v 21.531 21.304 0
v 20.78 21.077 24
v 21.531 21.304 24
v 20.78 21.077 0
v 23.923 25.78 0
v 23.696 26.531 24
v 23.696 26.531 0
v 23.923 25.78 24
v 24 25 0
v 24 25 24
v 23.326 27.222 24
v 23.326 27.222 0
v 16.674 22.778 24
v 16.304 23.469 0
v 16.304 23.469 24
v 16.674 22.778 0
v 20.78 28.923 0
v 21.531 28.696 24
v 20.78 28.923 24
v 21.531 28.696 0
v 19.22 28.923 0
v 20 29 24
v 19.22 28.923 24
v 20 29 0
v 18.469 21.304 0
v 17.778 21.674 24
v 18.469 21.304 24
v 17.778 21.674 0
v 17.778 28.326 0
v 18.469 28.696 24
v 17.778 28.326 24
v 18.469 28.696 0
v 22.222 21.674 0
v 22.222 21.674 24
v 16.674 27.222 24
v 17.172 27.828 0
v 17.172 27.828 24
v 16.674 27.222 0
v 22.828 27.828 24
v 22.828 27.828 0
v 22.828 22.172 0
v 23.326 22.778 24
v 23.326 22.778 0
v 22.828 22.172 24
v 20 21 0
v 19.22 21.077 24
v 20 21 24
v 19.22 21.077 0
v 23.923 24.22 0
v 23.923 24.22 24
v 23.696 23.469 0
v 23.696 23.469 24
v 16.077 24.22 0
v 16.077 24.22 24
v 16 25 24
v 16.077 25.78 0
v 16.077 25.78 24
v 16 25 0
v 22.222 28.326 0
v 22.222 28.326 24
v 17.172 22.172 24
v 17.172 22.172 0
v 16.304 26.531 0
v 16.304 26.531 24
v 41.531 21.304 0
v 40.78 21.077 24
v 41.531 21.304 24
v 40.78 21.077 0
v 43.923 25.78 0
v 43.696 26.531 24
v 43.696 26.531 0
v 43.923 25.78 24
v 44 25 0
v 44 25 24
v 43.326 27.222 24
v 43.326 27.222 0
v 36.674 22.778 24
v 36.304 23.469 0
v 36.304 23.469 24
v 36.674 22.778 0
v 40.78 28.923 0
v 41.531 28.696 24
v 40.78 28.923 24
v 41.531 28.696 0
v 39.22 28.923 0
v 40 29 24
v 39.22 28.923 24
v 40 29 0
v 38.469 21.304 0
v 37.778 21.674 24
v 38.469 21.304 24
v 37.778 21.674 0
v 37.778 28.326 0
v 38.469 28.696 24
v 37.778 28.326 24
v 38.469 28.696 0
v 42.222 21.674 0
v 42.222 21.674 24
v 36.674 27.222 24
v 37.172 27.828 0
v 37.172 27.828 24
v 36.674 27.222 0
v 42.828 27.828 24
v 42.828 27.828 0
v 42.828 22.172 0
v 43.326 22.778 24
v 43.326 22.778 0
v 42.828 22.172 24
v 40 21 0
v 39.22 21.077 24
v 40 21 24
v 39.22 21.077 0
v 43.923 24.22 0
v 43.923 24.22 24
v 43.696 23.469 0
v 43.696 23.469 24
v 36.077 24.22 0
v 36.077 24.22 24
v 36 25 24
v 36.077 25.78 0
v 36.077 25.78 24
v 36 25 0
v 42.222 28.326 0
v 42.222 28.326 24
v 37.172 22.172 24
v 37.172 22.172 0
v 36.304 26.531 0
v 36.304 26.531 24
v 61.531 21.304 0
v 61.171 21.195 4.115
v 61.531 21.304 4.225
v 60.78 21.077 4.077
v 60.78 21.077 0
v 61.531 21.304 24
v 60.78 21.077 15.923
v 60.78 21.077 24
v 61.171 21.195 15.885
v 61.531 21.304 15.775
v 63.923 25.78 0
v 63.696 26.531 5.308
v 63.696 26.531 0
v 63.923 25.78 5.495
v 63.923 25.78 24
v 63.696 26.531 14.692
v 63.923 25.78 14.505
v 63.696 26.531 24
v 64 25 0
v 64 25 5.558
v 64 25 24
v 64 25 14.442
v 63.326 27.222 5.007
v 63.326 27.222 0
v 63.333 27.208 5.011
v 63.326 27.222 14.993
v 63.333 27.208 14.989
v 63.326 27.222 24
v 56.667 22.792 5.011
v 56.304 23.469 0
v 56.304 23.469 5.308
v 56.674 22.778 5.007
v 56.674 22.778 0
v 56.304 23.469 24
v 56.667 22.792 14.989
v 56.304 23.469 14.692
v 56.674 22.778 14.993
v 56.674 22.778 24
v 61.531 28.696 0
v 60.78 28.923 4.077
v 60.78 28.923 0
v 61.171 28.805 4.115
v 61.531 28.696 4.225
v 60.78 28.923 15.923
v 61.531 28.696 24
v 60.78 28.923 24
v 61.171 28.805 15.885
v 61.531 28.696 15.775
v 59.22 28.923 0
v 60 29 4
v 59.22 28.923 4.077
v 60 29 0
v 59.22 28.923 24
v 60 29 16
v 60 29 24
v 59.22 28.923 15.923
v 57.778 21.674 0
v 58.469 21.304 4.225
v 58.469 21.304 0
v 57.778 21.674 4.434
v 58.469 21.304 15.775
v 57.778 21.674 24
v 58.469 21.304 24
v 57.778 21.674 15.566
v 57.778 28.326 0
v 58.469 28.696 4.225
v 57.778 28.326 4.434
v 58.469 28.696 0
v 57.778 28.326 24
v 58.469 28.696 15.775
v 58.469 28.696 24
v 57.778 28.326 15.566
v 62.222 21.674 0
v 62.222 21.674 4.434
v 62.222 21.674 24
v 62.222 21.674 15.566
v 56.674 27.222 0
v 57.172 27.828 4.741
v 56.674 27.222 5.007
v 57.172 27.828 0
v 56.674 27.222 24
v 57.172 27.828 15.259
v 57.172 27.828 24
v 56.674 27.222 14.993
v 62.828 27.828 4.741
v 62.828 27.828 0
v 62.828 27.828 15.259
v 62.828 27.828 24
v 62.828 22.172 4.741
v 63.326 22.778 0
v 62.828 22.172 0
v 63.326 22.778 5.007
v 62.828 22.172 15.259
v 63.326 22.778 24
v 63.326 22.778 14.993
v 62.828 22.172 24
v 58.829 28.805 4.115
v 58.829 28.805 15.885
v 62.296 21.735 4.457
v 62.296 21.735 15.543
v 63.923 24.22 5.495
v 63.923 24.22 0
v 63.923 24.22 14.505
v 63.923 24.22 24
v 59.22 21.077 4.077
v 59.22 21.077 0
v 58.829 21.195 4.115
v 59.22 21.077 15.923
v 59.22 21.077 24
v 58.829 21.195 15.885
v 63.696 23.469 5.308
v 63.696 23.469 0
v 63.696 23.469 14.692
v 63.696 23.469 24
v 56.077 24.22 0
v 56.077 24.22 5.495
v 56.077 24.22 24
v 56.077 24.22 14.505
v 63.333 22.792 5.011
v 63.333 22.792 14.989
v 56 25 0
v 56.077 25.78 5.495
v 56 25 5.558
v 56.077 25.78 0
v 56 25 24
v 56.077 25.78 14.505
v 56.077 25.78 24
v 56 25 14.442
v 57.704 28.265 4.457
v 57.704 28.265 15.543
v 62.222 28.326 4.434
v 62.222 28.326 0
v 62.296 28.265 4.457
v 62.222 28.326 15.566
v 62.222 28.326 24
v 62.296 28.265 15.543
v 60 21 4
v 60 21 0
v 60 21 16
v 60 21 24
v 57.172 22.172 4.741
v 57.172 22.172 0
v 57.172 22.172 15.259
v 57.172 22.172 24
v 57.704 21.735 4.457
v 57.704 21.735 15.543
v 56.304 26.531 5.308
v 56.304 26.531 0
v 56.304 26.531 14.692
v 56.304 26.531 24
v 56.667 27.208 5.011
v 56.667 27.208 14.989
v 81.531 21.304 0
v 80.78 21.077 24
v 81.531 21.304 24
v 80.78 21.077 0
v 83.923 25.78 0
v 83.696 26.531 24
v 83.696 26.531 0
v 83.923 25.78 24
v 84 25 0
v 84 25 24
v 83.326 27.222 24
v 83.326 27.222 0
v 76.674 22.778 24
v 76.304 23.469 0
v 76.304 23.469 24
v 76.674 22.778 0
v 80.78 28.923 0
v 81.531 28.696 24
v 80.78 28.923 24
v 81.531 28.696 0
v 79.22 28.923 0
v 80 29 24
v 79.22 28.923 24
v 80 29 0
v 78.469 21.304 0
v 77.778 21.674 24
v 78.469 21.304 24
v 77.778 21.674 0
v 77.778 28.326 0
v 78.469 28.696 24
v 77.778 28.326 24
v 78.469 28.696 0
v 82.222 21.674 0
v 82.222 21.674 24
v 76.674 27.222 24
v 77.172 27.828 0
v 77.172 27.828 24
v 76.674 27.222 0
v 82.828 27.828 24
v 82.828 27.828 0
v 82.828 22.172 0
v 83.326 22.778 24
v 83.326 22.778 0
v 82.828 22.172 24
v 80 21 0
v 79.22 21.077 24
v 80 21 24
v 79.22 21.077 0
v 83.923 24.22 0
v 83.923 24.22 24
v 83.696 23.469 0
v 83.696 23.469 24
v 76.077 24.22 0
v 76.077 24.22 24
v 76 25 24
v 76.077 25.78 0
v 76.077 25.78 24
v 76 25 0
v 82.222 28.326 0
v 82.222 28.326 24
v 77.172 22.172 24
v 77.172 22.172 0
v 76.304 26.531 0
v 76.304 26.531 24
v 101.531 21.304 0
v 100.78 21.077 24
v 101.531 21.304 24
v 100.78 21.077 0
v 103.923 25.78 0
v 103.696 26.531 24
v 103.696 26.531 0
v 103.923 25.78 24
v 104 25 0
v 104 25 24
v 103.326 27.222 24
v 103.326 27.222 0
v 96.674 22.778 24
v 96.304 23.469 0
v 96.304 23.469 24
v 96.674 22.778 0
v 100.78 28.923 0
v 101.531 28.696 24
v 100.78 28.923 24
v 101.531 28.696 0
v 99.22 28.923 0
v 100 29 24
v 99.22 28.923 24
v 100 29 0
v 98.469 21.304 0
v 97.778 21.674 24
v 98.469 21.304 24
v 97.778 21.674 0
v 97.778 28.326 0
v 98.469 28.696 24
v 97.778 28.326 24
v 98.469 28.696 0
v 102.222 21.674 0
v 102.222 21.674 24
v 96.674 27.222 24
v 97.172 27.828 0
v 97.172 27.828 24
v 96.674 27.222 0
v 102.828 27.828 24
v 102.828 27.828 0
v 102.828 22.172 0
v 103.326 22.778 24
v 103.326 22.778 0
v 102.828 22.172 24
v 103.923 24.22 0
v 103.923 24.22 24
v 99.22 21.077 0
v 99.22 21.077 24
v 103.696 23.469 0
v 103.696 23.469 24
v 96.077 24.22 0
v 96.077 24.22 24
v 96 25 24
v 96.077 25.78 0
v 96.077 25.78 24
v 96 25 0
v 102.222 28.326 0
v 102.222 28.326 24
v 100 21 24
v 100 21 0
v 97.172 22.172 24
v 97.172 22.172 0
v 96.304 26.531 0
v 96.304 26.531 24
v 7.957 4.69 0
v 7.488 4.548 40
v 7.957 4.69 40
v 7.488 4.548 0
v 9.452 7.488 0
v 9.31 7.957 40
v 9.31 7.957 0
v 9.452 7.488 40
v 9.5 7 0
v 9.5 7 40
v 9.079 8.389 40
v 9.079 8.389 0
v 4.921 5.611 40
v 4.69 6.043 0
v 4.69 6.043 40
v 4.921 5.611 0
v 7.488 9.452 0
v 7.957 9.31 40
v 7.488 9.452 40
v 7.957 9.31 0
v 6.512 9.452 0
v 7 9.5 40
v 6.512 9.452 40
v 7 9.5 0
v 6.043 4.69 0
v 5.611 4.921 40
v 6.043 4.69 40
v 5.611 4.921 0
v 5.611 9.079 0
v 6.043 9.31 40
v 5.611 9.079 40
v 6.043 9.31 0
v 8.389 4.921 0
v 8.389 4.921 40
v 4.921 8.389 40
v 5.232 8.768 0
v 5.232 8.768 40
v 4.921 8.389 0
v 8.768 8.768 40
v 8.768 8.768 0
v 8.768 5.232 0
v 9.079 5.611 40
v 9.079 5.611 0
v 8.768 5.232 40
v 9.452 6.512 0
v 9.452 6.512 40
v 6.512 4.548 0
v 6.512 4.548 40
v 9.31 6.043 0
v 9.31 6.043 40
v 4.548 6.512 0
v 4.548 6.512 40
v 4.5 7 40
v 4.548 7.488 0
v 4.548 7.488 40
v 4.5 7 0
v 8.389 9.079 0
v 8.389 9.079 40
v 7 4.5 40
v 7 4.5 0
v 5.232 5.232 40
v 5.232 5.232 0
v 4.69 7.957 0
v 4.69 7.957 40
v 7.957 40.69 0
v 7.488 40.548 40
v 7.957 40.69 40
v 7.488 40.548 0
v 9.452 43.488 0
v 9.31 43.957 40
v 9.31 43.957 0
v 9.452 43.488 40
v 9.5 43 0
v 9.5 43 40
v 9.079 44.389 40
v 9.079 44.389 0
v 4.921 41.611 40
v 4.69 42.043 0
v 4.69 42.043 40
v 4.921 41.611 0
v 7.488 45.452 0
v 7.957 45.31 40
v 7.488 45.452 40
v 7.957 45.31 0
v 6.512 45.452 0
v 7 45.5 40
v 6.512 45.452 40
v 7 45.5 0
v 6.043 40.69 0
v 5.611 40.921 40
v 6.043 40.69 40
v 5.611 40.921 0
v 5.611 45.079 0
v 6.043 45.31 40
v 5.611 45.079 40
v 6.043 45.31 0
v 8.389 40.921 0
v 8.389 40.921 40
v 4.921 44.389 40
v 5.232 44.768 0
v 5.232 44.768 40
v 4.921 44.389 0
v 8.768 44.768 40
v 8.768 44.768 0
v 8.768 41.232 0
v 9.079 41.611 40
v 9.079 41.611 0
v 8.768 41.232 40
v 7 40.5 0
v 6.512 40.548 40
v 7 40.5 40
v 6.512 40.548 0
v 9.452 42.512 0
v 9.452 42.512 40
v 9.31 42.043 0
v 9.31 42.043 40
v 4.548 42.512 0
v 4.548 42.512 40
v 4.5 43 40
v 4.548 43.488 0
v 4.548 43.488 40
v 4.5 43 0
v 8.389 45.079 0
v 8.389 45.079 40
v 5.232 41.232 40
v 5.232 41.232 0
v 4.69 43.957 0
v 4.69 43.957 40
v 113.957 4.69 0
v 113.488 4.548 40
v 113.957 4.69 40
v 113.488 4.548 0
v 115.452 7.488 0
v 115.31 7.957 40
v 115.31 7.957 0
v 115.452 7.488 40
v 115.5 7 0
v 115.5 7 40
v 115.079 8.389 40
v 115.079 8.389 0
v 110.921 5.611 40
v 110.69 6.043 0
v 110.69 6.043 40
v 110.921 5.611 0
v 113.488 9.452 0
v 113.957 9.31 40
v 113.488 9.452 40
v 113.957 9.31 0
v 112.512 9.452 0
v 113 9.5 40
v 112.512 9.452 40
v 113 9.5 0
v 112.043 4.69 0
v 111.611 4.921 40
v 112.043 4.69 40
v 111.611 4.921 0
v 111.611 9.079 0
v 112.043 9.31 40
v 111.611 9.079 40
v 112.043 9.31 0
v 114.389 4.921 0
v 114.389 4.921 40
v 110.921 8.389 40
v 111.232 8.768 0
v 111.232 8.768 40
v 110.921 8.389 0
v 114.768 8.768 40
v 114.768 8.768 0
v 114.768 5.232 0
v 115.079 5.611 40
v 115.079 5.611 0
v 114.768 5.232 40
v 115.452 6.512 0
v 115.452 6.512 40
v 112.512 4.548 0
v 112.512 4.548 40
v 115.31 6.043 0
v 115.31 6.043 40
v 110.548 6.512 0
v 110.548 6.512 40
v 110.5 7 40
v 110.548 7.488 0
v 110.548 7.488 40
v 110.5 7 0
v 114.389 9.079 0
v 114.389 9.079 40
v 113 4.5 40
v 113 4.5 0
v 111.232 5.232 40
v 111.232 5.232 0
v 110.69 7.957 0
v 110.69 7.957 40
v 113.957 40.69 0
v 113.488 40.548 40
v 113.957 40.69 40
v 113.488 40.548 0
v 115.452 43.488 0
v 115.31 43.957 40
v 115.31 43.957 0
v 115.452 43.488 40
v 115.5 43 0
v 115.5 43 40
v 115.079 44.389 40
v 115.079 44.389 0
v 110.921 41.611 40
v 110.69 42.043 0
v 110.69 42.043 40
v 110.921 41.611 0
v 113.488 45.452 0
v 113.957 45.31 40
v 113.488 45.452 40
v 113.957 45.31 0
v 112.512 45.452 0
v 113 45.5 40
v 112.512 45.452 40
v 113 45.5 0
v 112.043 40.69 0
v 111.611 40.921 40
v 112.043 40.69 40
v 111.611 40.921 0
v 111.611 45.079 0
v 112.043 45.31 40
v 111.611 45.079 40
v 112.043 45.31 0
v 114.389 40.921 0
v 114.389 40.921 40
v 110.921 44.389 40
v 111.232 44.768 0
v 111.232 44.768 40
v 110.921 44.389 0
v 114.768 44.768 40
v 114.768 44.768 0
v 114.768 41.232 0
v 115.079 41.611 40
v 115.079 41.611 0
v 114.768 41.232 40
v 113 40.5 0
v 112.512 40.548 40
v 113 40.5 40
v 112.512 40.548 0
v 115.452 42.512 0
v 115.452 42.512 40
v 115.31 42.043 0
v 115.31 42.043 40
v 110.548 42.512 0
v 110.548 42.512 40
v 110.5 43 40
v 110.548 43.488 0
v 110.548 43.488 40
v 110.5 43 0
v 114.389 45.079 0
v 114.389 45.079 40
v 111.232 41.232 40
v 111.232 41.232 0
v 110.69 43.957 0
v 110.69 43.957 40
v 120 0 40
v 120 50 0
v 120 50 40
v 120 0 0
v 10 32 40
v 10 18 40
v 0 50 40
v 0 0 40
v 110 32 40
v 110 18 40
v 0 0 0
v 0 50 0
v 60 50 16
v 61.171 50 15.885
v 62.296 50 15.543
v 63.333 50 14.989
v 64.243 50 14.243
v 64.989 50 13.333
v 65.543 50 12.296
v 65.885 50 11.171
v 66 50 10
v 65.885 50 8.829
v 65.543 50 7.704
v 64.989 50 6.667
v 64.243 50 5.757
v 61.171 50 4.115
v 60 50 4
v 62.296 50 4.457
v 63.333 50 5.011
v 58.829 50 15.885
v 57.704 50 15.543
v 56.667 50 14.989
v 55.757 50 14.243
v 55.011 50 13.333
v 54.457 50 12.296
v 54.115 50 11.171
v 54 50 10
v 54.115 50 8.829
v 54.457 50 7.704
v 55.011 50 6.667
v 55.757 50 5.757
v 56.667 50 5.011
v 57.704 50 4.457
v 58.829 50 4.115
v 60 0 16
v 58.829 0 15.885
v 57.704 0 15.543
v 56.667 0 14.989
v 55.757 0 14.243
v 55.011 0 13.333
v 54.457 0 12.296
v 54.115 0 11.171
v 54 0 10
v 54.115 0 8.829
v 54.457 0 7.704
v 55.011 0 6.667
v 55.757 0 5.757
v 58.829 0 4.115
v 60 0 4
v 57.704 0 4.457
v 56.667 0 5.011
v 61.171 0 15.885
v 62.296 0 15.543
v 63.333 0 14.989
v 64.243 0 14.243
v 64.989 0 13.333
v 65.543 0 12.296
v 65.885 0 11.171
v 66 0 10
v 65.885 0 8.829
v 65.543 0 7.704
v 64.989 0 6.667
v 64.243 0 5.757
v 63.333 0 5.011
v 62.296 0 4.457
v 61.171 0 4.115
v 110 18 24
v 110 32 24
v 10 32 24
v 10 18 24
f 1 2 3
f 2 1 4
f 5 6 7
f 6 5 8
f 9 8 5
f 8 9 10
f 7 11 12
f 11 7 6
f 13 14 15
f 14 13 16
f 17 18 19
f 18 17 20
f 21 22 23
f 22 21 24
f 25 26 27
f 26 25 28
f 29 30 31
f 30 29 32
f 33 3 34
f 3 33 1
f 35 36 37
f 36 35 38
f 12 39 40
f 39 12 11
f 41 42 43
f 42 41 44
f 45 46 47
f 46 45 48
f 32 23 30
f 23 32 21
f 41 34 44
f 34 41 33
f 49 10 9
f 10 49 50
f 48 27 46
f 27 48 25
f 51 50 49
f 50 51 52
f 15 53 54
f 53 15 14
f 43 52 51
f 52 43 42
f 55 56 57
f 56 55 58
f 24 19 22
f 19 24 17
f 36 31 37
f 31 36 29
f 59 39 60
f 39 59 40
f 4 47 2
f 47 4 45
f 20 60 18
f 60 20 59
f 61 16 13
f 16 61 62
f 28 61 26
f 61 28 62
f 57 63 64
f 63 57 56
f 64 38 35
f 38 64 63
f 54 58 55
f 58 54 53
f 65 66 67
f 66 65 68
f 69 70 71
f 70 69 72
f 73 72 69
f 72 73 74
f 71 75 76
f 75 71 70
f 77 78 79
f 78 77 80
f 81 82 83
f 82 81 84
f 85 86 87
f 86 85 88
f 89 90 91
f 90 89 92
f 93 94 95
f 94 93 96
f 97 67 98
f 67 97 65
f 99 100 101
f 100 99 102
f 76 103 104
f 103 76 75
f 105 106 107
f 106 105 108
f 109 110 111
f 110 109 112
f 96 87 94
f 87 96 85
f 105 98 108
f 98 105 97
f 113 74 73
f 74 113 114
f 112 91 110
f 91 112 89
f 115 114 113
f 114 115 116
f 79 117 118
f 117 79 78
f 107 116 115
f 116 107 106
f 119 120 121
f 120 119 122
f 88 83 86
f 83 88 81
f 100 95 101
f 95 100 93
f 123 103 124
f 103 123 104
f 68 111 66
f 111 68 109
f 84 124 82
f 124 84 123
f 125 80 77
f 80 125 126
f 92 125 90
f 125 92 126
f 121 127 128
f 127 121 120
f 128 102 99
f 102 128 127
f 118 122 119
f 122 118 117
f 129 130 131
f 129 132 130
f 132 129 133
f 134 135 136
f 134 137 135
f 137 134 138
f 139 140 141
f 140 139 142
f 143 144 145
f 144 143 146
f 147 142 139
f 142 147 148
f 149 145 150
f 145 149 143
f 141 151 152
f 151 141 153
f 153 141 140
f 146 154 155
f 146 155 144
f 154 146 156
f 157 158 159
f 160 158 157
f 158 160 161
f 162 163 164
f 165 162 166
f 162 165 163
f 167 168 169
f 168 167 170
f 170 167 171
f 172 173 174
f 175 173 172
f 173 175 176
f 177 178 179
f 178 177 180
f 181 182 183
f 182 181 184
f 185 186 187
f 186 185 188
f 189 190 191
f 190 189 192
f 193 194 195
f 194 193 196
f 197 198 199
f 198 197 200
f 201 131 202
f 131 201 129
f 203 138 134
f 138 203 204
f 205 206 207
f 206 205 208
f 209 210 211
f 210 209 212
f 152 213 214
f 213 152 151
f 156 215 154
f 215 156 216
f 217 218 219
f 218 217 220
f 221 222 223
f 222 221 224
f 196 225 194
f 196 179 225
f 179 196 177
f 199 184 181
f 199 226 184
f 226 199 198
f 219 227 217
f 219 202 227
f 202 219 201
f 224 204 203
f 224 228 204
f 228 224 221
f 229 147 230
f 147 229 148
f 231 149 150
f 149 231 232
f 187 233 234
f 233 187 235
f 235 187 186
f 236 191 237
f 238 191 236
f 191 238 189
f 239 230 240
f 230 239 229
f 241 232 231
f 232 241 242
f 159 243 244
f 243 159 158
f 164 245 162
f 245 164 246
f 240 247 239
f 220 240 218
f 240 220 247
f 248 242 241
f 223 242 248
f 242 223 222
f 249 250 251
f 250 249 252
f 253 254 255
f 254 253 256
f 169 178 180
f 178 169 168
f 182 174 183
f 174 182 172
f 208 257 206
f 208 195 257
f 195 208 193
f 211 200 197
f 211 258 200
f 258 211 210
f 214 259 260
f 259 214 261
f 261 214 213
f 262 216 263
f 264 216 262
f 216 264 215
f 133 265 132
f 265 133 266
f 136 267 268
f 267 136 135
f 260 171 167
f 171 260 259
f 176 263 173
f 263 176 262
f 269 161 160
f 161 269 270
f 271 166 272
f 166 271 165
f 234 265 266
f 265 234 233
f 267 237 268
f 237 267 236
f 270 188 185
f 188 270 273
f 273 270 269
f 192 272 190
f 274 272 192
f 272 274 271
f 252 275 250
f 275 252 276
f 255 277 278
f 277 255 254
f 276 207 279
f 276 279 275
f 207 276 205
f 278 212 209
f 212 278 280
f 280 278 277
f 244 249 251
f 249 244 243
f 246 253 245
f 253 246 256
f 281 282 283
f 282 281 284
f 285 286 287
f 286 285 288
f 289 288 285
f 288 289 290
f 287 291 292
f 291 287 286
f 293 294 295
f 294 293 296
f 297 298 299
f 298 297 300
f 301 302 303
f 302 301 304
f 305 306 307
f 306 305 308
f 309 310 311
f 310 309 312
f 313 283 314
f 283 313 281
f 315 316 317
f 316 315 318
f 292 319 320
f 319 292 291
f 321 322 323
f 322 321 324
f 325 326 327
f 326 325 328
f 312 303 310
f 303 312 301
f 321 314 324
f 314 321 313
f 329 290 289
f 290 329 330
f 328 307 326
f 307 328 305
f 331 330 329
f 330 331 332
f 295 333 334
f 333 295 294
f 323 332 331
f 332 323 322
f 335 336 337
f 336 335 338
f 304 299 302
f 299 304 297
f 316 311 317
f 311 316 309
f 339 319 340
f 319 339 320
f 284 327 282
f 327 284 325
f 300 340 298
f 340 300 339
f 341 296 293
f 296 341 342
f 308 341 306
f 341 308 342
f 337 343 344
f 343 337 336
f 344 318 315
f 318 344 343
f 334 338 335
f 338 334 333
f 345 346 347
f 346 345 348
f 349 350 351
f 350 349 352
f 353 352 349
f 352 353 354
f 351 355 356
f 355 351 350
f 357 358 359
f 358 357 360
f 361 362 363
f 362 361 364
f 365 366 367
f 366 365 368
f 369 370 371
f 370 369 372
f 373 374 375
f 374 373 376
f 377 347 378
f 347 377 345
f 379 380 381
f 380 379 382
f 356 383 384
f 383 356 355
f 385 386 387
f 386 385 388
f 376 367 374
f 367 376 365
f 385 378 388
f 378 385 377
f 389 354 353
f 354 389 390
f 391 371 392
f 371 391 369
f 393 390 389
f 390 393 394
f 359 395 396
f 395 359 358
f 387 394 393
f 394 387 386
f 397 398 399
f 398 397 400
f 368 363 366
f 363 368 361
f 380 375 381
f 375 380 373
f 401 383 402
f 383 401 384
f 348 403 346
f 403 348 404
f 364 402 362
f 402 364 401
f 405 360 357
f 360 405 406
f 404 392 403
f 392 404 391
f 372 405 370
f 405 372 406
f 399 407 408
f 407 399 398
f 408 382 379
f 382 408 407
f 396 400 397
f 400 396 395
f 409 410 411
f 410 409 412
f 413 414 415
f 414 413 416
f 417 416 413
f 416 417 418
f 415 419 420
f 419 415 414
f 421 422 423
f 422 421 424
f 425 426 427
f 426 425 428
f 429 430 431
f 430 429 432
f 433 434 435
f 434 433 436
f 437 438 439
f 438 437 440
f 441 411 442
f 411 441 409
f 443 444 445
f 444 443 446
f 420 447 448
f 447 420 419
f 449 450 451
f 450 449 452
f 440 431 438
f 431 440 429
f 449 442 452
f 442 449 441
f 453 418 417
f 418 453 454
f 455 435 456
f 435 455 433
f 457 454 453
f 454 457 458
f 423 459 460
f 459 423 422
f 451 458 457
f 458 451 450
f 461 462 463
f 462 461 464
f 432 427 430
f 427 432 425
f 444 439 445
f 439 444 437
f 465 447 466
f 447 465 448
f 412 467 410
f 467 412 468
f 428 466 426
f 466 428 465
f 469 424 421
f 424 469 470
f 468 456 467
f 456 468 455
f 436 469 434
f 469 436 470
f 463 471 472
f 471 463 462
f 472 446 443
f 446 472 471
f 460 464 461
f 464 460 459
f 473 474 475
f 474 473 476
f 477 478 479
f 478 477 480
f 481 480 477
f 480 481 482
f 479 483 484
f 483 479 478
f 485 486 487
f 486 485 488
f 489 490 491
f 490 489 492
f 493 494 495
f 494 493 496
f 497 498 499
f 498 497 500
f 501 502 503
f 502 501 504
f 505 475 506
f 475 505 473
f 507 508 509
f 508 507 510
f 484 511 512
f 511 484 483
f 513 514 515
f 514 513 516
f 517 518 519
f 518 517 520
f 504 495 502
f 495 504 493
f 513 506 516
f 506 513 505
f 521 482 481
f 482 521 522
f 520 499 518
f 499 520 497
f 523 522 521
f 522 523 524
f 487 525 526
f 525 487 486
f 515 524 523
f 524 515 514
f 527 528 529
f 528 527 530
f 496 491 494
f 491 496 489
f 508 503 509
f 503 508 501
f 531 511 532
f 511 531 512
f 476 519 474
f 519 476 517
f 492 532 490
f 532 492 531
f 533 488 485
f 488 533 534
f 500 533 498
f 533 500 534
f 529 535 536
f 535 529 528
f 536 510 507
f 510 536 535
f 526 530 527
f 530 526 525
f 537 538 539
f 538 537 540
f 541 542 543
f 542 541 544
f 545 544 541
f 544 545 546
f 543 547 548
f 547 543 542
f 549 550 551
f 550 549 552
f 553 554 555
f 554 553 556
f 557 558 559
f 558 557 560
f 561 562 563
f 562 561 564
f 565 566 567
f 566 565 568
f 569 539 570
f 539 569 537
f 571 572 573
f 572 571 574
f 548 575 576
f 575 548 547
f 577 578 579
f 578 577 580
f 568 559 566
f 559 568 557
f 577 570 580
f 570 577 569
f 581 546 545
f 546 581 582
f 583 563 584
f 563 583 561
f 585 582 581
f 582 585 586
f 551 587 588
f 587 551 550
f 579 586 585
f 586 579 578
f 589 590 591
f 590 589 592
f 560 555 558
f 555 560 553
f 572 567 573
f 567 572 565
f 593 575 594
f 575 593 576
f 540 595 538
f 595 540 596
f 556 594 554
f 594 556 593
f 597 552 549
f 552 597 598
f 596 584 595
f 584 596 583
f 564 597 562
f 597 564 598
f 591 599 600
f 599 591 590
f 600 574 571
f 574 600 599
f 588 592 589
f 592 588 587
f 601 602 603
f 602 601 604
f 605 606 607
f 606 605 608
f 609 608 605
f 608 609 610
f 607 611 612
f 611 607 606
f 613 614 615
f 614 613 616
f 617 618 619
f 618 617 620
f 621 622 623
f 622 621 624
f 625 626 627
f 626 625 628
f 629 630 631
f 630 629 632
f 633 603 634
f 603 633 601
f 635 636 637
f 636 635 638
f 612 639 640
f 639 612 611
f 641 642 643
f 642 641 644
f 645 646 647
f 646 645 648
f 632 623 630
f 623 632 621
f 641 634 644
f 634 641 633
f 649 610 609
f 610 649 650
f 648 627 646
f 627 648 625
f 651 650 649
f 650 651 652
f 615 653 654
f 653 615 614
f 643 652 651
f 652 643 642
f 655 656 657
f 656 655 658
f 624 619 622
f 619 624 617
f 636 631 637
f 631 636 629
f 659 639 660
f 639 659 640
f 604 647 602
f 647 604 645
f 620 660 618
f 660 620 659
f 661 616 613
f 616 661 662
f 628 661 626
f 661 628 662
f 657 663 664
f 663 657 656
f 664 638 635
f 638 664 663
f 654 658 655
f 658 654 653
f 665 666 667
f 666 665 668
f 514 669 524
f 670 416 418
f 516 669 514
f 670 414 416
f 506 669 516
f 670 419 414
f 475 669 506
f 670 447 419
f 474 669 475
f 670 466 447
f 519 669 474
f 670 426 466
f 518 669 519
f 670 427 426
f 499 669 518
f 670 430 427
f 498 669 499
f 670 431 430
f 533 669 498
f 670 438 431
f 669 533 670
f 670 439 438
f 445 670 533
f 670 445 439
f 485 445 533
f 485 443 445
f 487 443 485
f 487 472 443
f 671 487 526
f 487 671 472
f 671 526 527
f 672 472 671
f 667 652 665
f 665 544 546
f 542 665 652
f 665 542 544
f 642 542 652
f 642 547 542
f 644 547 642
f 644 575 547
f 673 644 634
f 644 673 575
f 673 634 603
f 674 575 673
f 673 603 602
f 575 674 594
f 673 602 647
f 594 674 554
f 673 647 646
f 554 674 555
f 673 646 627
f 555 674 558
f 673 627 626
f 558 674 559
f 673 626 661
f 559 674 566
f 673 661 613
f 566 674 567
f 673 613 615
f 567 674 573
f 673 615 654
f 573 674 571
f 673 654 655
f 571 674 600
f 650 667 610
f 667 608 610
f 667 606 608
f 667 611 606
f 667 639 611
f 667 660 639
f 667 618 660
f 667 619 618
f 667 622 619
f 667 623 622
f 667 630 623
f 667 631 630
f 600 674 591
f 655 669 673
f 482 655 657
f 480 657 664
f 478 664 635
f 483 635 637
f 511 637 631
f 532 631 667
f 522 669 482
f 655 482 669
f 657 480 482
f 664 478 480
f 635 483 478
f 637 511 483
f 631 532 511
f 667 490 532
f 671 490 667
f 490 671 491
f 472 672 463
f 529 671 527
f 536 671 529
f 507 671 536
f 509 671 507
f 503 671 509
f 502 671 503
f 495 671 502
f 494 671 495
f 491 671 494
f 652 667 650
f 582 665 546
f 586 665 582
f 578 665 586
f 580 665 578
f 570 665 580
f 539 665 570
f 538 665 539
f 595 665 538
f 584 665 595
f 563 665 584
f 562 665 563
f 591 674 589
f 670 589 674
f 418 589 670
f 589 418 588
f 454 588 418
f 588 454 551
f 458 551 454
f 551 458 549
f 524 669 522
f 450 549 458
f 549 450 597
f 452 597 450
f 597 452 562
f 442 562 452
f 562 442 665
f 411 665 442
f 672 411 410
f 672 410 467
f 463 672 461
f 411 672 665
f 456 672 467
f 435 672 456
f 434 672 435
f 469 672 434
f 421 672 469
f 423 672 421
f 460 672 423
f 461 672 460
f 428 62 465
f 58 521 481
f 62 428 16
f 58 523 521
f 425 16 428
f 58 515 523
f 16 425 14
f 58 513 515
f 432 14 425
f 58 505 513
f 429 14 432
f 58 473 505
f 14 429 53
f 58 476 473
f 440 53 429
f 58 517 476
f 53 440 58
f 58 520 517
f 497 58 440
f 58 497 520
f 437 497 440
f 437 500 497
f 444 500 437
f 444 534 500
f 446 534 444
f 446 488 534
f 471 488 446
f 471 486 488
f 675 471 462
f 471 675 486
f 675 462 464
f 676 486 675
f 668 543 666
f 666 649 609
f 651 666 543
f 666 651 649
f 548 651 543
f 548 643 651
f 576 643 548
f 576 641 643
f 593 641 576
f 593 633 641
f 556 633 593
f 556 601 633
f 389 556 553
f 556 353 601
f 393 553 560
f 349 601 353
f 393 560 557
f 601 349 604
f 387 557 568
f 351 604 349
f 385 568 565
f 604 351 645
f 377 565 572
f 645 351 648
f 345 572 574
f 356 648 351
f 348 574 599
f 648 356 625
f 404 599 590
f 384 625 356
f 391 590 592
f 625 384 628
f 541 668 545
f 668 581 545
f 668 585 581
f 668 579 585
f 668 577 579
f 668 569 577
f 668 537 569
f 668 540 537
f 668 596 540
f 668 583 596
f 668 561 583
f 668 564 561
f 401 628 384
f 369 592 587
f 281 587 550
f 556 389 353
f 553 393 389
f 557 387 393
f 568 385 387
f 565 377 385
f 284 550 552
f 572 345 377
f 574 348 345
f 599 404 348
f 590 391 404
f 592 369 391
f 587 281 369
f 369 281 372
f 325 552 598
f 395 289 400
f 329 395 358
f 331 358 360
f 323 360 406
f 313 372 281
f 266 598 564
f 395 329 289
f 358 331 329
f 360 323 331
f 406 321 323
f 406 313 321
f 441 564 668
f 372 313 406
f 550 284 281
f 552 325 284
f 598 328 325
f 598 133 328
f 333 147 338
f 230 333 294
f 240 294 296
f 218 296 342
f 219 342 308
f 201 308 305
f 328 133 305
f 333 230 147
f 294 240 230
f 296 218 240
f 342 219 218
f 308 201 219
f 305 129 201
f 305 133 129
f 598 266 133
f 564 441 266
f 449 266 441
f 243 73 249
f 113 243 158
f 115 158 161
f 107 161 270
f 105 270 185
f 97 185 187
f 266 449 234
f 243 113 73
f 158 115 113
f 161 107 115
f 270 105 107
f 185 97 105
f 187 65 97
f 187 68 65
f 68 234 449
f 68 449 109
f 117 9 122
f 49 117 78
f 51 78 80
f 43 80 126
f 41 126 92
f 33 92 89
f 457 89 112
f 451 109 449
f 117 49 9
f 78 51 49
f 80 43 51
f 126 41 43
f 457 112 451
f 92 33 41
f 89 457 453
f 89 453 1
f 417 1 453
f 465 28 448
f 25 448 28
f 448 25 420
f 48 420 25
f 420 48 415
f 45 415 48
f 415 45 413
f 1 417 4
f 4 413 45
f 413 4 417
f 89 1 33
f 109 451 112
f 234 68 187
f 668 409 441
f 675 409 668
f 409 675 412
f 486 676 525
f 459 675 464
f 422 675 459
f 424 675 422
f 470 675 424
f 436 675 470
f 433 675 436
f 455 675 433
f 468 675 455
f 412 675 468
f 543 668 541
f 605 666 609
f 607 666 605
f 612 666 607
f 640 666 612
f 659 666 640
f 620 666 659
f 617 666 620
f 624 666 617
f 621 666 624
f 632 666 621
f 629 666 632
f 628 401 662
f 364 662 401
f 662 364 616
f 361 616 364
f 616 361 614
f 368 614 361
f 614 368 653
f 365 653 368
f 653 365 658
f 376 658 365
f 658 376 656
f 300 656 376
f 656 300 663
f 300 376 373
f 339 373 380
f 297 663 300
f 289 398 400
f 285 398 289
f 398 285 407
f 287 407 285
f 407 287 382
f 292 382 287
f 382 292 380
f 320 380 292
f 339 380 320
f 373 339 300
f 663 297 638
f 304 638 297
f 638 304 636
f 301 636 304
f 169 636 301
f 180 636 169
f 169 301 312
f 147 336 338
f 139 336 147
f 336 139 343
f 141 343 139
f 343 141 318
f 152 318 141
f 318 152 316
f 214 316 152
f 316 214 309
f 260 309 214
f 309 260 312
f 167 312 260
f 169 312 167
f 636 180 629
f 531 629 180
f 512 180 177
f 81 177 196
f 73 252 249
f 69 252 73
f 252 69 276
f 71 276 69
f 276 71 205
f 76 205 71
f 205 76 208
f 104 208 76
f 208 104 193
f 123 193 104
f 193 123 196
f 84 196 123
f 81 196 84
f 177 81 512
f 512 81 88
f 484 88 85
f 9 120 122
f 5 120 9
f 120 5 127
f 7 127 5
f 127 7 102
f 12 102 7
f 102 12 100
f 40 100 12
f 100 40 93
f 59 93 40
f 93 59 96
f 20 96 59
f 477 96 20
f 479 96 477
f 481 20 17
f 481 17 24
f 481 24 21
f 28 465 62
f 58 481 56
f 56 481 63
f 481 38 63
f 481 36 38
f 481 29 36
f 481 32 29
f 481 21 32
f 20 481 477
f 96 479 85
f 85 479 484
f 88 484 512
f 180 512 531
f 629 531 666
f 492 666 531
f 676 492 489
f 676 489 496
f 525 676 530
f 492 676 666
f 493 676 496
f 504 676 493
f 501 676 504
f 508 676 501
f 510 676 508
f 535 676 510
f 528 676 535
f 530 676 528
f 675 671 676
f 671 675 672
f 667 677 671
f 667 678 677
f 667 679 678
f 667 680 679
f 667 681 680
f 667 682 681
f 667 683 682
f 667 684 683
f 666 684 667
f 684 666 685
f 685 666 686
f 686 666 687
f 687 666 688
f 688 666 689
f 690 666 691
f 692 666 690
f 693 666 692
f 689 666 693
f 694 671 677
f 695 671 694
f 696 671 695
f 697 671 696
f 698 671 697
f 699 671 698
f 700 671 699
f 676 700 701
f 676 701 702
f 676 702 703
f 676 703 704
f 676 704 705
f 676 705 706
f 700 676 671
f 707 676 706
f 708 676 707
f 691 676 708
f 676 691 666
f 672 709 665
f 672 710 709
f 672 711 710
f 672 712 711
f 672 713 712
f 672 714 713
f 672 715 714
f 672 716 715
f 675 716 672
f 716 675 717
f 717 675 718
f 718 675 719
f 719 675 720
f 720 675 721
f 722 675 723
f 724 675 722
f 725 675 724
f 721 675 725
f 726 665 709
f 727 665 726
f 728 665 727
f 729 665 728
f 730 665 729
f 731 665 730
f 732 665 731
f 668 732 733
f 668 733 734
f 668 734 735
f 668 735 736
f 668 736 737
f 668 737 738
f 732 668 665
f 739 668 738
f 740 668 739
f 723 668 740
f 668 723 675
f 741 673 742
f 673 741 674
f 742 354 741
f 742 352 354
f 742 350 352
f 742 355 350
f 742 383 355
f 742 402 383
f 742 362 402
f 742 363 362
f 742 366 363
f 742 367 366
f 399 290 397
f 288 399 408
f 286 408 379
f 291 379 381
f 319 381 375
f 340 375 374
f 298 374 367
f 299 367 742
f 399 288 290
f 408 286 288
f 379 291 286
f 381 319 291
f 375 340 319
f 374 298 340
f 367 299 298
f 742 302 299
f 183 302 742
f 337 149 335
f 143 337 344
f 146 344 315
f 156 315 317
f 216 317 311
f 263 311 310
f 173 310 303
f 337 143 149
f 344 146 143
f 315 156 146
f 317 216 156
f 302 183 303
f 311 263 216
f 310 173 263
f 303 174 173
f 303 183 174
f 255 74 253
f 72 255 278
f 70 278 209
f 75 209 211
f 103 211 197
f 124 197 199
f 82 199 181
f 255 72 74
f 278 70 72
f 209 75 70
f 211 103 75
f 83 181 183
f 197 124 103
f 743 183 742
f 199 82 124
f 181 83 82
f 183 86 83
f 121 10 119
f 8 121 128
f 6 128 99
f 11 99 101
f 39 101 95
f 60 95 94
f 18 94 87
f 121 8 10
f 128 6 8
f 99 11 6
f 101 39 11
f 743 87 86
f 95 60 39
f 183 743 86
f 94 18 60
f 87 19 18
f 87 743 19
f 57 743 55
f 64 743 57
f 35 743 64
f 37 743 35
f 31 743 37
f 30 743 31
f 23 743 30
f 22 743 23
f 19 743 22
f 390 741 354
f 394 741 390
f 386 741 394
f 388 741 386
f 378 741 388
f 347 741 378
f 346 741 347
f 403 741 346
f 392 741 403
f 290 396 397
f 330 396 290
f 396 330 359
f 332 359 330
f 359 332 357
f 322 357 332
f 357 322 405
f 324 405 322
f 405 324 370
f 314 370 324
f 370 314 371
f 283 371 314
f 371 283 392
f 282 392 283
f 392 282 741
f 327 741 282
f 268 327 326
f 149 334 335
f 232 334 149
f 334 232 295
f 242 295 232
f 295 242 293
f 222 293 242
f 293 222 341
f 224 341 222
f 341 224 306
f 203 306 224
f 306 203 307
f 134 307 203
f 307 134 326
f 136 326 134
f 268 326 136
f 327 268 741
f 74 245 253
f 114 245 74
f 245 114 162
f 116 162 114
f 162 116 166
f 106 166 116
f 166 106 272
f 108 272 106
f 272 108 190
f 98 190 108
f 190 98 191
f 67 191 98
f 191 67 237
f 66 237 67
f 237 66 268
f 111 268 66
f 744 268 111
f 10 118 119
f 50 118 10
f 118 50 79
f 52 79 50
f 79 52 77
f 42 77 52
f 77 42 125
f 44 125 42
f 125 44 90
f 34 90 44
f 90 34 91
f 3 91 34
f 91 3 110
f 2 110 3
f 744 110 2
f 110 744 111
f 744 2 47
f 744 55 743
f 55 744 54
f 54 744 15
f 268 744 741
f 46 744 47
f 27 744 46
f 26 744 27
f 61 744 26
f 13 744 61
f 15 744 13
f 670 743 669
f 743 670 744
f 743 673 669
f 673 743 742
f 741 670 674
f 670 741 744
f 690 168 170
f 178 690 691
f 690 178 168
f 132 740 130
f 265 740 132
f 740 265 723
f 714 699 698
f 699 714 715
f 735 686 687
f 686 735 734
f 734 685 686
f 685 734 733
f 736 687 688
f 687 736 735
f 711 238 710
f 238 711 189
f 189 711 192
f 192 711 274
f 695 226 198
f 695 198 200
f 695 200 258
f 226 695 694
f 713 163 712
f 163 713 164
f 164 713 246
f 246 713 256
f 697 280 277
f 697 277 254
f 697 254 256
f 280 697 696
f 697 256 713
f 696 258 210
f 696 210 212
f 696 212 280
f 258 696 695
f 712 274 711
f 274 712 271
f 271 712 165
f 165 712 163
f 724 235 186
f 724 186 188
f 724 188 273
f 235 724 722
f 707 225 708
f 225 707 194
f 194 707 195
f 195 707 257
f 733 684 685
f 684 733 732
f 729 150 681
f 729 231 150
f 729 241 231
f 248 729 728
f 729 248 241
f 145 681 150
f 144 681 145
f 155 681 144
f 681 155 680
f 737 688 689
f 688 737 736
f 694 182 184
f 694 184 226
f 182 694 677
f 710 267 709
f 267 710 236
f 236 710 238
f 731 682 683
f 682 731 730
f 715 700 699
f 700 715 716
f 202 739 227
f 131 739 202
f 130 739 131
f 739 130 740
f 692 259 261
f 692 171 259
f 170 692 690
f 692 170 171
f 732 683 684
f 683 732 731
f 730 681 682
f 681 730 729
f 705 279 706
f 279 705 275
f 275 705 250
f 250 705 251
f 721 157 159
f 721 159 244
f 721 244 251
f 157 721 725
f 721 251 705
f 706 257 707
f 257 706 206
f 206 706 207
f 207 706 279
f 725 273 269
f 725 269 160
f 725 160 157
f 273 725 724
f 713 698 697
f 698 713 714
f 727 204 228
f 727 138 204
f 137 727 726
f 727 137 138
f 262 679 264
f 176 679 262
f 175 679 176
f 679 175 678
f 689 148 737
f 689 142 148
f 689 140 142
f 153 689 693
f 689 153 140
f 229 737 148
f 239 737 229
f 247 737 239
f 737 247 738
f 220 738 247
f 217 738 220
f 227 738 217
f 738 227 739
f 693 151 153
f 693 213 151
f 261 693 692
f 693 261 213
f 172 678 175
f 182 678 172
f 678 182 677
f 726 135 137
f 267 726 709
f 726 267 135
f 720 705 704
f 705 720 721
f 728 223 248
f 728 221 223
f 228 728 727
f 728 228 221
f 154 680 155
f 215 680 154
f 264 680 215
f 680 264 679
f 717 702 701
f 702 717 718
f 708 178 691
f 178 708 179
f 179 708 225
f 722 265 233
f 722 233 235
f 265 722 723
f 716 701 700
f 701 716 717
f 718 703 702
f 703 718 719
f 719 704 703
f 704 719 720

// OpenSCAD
$fn = 32;

// ----------------------------------------------------------------------
// Manifold block: side_outlet manifold
// ----------------------------------------------------------------------

// --- parameters (mm) ---
block_l = 120;            // block length, X
block_w = 50;             // block width, Y
block_h = 40;             // block height, Z
port_d = 8;               // port bore diameter
port_pitch = 20;          // port pitch along X
gallery_d = 14;           // top gallery width, Y
gallery_depth = 16;       // gallery pocket depth
wall_p = 10;              // gallery end wall thickness, X
mnt_d = 5;                // mounting hole diameter
mnt_in = 7;               // mounting hole inset from the edges
out_d = 12;               // outlet bore diameter
out_z = 10;               // outlet axis height
fit_tol = 0.1;            // tolerance for press fits, mm
free_tol = 0.5;           // tolerance for clearance fits, mm

n_ports = 5;  // ports in the row
port_x0 = (block_l - (n_ports - 1) * port_pitch) / 2;  // first port X

difference() {
  cube([block_l, block_w, block_h]);
  for (i = [0 : n_ports - 1])
    translate([port_x0 + i * port_pitch, block_w / 2, -1])
      cylinder(h = block_h + 2, d = port_d);
  translate([wall_p, block_w / 2 - gallery_d / 2, block_h - gallery_depth])
    cube([block_l - 2 * wall_p, gallery_d, gallery_depth + 1]);
  for (cx = [mnt_in, block_l - mnt_in])
    for (cy = [mnt_in, block_w - mnt_in])
      translate([cx, cy, -1]) cylinder(h = block_h + 2, d = mnt_d);
  translate([block_l / 2, -1, out_z]) rotate([-90, 0, 0])
    cylinder(h = block_w + 2, d = out_d);
}
